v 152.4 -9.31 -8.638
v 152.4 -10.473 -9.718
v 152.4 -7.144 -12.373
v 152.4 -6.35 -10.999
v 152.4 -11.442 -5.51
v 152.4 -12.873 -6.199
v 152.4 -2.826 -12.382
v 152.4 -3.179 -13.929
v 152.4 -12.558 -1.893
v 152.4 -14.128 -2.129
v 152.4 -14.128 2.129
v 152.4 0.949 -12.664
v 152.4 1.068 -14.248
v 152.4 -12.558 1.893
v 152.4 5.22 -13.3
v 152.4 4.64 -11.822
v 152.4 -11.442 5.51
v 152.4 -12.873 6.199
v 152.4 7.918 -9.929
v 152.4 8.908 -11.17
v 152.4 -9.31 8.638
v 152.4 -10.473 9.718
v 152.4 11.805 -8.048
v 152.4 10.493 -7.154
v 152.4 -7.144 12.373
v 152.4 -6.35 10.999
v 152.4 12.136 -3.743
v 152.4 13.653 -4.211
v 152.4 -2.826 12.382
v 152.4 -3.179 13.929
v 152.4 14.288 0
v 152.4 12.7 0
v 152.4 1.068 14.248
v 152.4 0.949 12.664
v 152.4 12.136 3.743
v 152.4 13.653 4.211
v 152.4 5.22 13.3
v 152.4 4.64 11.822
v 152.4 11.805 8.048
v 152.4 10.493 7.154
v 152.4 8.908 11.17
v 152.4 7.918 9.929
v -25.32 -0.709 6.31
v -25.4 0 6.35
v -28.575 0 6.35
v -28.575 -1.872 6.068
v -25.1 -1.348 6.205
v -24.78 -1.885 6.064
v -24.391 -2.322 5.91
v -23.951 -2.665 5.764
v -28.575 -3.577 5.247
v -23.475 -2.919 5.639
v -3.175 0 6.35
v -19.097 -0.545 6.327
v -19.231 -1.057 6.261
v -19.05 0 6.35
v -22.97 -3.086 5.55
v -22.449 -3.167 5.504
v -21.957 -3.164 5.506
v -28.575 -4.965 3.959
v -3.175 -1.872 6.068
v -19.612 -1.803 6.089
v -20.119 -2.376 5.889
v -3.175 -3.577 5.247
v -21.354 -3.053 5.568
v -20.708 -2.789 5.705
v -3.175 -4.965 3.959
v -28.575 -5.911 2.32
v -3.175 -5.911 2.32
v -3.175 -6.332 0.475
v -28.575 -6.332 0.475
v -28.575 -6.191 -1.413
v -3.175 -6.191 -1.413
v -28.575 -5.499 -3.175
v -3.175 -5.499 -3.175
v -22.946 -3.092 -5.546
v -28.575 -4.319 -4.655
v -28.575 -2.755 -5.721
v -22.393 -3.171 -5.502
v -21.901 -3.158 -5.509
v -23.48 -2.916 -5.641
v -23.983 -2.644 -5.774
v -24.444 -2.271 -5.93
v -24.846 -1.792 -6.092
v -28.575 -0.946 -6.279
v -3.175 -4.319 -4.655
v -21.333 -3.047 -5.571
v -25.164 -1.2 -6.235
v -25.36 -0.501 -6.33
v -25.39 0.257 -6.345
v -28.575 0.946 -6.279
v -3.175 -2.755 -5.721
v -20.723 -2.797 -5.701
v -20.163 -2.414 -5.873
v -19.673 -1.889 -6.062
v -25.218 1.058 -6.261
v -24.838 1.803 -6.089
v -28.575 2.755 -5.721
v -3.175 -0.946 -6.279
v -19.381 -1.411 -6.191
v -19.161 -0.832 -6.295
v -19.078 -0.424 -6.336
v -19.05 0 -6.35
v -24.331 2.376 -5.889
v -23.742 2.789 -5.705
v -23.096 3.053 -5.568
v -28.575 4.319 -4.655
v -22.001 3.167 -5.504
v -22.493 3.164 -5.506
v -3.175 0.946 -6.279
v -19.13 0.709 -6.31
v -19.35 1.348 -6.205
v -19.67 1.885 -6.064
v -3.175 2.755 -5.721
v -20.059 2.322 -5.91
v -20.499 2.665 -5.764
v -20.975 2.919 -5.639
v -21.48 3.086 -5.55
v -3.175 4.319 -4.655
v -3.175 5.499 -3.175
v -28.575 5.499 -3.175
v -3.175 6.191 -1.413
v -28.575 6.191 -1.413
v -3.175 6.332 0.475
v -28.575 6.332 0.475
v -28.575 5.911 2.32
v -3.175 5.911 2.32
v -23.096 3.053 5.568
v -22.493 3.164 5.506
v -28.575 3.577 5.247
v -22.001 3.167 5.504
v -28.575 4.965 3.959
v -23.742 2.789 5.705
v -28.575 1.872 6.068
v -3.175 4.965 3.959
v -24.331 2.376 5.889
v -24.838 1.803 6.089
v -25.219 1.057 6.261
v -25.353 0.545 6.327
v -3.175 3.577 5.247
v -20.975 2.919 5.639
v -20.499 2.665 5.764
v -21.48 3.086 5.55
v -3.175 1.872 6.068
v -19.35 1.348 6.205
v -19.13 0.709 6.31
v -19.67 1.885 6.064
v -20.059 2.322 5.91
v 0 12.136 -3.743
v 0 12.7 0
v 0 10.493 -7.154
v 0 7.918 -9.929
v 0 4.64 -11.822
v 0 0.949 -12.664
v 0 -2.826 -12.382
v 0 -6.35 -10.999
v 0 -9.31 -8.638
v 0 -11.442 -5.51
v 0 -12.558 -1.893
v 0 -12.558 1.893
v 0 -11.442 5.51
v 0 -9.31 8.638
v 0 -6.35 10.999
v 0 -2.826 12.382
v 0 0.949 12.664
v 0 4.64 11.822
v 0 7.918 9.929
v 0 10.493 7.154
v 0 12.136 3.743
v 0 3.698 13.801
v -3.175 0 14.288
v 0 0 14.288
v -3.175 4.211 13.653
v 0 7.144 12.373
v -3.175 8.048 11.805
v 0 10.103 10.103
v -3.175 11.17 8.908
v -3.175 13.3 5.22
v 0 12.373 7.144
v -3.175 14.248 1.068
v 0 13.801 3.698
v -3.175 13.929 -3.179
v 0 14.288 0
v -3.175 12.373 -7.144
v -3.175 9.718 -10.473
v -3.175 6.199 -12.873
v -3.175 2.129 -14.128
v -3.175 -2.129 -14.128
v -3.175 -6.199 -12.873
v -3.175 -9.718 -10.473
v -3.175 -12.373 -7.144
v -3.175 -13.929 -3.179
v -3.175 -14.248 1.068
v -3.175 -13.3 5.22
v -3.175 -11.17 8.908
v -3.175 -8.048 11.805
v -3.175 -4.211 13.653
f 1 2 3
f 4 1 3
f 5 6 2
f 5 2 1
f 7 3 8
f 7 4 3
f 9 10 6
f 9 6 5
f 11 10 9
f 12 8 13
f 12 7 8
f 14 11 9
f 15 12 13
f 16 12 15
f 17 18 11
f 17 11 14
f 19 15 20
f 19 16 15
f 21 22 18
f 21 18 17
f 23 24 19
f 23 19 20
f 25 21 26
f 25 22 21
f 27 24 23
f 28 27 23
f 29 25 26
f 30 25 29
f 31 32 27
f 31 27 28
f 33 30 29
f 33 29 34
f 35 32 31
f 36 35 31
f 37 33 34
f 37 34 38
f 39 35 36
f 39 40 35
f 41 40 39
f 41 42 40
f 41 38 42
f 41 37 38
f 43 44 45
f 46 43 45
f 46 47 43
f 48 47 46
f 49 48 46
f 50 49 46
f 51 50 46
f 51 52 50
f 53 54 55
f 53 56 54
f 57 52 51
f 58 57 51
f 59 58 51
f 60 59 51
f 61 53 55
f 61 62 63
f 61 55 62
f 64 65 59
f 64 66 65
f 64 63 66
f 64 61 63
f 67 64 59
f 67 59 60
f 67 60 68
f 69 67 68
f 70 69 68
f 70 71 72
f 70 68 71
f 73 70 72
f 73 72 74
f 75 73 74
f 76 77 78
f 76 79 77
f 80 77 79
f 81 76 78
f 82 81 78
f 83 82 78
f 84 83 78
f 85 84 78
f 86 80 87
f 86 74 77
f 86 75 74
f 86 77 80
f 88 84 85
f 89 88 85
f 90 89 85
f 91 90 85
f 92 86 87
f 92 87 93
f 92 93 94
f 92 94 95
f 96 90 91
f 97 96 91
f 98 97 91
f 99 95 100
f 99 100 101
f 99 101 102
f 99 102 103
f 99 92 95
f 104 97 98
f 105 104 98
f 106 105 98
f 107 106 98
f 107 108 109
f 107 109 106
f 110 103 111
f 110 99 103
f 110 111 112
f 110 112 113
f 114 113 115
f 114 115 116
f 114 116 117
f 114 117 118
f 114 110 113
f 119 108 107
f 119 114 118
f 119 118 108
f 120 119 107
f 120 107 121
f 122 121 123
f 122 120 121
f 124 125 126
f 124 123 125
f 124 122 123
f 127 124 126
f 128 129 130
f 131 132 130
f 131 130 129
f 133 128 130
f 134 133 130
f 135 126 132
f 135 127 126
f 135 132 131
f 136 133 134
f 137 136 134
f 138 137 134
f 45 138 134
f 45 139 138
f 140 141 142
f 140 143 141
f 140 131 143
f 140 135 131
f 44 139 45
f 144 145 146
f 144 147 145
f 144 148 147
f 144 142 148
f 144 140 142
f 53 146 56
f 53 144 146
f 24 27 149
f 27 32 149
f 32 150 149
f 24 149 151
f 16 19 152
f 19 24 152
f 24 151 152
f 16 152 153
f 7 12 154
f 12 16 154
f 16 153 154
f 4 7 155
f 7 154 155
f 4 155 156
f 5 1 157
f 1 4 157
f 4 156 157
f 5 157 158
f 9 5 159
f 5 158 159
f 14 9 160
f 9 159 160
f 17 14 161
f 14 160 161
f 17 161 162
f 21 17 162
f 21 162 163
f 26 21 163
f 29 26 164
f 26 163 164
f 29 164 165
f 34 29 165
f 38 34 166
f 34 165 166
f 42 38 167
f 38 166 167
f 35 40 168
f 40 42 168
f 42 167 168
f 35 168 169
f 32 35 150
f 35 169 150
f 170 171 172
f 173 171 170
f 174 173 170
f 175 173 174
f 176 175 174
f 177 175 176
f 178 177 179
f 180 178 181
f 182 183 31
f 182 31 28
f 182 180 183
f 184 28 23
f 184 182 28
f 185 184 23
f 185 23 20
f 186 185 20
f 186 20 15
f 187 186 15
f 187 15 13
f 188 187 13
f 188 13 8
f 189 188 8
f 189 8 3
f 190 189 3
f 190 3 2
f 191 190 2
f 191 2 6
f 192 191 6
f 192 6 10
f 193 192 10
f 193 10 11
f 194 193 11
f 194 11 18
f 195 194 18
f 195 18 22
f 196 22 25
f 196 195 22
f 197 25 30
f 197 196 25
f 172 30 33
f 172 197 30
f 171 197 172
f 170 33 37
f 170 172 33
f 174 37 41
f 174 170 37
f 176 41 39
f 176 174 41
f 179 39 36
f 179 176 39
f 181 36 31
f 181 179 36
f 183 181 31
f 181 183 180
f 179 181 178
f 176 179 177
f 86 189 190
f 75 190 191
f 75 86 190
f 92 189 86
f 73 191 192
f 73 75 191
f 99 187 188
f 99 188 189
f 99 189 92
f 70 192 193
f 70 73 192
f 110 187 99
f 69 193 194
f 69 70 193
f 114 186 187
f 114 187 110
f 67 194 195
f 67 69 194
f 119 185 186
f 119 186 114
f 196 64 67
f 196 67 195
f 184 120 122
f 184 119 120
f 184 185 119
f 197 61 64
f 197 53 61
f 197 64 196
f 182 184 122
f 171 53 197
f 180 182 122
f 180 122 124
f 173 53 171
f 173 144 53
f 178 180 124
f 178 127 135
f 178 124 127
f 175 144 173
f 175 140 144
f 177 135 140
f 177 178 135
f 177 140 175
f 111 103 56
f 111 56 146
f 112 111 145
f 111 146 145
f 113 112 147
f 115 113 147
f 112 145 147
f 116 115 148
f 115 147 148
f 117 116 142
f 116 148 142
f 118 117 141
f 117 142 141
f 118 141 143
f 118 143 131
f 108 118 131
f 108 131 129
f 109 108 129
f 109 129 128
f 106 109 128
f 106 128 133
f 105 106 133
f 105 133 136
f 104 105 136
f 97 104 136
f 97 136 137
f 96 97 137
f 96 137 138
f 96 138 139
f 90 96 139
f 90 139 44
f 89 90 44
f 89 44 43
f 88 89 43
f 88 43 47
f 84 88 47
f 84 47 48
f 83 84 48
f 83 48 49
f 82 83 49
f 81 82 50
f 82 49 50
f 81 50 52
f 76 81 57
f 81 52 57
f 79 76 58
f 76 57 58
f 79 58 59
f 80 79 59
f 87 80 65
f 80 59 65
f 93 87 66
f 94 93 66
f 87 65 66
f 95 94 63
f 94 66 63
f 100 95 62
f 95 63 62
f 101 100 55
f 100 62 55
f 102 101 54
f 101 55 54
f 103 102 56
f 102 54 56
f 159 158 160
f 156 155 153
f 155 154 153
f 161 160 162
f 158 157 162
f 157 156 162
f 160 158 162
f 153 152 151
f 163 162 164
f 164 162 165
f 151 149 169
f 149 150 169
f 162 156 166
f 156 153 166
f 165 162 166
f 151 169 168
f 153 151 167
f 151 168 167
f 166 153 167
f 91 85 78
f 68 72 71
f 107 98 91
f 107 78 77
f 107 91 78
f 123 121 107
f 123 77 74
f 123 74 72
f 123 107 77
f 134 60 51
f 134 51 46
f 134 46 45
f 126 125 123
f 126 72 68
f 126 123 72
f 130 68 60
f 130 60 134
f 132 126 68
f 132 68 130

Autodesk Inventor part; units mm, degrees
ref_plane "YZ Plane" through (0, 0, 0) normal (1, 0, 0) x (0, 1, 0)
ref_plane "XZ Plane" through (0, 0, 0) normal (0, 1, 0) x (-1, 0, 0)
sketch "Sketch1" plane through (0, 0, 0) normal (1, 0, 0) x (0, 1, 0)
  circle A0 centre (0, 0) radius 14.2875
  circle A1 centre (0, 0) radius 12.7
  dimension "d0" = 28.575
  dimension "d1" = 25.4
extrude "Extrusion1" add sketch "Sketch1" along normal blind 152.4
sketch "Sketch2" plane through (0, 0, 0) normal (-1, 0, 0) x (0, 0, 1)
  circle A0 centre (0, 0) radius 14.2875 projected
extrude "Extrusion2" add sketch "Sketch2" along normal blind 3.175
sketch "Sketch3" plane through (-3.175, 0, 0) normal (-1, 0, 0) x (0, 0, 1)
  circle A0 centre (0, 0) radius 6.35
  dimension "d6" = 12.7
extrude "Extrusion3" add sketch "Sketch3" along normal blind 25.4
sketch "Sketch4" plane through (-28.575, 0, 0) normal (-1, 0, 0) x (0, 0, 1)
  circle A0 centre (0, 0) radius 6.35 projected
  circle A1 centre (0, 0) radius 6.35 projected
  point P0 (6.35, 0)
  point P1 (-6.35, 0)
ref_plane "Work Plane3" through (-28.575, 0, 0) normal (0, 0, -1) x (-1, 0, 0)
ref_plane "Work Plane1" through (-28.575, 0, 6.35) normal (0, 0, 1) x (1, 0, 0)
ref_plane "Work Plane2" through (-28.575, 0, -6.35) normal (0, 0, -1) x (-1, 0, 0)
sketch "Sketch5" plane through (-28.575, 0, 6.35) normal (0, 0, 1) x (1, 0, 0)
  circle A0 centre (6.35, 0) radius 3.175
  line L0 (0, 6.35) -> (0, -6.35) projected
  point P0 (28.575, 0)
  dimension "d9" = 6.35
  dimension "d10" = 6.35
extrude "Extrusion4" cut sketch "Sketch5" against normal blind 25.4
properties part number "Intake Basic Piston - Outer"
